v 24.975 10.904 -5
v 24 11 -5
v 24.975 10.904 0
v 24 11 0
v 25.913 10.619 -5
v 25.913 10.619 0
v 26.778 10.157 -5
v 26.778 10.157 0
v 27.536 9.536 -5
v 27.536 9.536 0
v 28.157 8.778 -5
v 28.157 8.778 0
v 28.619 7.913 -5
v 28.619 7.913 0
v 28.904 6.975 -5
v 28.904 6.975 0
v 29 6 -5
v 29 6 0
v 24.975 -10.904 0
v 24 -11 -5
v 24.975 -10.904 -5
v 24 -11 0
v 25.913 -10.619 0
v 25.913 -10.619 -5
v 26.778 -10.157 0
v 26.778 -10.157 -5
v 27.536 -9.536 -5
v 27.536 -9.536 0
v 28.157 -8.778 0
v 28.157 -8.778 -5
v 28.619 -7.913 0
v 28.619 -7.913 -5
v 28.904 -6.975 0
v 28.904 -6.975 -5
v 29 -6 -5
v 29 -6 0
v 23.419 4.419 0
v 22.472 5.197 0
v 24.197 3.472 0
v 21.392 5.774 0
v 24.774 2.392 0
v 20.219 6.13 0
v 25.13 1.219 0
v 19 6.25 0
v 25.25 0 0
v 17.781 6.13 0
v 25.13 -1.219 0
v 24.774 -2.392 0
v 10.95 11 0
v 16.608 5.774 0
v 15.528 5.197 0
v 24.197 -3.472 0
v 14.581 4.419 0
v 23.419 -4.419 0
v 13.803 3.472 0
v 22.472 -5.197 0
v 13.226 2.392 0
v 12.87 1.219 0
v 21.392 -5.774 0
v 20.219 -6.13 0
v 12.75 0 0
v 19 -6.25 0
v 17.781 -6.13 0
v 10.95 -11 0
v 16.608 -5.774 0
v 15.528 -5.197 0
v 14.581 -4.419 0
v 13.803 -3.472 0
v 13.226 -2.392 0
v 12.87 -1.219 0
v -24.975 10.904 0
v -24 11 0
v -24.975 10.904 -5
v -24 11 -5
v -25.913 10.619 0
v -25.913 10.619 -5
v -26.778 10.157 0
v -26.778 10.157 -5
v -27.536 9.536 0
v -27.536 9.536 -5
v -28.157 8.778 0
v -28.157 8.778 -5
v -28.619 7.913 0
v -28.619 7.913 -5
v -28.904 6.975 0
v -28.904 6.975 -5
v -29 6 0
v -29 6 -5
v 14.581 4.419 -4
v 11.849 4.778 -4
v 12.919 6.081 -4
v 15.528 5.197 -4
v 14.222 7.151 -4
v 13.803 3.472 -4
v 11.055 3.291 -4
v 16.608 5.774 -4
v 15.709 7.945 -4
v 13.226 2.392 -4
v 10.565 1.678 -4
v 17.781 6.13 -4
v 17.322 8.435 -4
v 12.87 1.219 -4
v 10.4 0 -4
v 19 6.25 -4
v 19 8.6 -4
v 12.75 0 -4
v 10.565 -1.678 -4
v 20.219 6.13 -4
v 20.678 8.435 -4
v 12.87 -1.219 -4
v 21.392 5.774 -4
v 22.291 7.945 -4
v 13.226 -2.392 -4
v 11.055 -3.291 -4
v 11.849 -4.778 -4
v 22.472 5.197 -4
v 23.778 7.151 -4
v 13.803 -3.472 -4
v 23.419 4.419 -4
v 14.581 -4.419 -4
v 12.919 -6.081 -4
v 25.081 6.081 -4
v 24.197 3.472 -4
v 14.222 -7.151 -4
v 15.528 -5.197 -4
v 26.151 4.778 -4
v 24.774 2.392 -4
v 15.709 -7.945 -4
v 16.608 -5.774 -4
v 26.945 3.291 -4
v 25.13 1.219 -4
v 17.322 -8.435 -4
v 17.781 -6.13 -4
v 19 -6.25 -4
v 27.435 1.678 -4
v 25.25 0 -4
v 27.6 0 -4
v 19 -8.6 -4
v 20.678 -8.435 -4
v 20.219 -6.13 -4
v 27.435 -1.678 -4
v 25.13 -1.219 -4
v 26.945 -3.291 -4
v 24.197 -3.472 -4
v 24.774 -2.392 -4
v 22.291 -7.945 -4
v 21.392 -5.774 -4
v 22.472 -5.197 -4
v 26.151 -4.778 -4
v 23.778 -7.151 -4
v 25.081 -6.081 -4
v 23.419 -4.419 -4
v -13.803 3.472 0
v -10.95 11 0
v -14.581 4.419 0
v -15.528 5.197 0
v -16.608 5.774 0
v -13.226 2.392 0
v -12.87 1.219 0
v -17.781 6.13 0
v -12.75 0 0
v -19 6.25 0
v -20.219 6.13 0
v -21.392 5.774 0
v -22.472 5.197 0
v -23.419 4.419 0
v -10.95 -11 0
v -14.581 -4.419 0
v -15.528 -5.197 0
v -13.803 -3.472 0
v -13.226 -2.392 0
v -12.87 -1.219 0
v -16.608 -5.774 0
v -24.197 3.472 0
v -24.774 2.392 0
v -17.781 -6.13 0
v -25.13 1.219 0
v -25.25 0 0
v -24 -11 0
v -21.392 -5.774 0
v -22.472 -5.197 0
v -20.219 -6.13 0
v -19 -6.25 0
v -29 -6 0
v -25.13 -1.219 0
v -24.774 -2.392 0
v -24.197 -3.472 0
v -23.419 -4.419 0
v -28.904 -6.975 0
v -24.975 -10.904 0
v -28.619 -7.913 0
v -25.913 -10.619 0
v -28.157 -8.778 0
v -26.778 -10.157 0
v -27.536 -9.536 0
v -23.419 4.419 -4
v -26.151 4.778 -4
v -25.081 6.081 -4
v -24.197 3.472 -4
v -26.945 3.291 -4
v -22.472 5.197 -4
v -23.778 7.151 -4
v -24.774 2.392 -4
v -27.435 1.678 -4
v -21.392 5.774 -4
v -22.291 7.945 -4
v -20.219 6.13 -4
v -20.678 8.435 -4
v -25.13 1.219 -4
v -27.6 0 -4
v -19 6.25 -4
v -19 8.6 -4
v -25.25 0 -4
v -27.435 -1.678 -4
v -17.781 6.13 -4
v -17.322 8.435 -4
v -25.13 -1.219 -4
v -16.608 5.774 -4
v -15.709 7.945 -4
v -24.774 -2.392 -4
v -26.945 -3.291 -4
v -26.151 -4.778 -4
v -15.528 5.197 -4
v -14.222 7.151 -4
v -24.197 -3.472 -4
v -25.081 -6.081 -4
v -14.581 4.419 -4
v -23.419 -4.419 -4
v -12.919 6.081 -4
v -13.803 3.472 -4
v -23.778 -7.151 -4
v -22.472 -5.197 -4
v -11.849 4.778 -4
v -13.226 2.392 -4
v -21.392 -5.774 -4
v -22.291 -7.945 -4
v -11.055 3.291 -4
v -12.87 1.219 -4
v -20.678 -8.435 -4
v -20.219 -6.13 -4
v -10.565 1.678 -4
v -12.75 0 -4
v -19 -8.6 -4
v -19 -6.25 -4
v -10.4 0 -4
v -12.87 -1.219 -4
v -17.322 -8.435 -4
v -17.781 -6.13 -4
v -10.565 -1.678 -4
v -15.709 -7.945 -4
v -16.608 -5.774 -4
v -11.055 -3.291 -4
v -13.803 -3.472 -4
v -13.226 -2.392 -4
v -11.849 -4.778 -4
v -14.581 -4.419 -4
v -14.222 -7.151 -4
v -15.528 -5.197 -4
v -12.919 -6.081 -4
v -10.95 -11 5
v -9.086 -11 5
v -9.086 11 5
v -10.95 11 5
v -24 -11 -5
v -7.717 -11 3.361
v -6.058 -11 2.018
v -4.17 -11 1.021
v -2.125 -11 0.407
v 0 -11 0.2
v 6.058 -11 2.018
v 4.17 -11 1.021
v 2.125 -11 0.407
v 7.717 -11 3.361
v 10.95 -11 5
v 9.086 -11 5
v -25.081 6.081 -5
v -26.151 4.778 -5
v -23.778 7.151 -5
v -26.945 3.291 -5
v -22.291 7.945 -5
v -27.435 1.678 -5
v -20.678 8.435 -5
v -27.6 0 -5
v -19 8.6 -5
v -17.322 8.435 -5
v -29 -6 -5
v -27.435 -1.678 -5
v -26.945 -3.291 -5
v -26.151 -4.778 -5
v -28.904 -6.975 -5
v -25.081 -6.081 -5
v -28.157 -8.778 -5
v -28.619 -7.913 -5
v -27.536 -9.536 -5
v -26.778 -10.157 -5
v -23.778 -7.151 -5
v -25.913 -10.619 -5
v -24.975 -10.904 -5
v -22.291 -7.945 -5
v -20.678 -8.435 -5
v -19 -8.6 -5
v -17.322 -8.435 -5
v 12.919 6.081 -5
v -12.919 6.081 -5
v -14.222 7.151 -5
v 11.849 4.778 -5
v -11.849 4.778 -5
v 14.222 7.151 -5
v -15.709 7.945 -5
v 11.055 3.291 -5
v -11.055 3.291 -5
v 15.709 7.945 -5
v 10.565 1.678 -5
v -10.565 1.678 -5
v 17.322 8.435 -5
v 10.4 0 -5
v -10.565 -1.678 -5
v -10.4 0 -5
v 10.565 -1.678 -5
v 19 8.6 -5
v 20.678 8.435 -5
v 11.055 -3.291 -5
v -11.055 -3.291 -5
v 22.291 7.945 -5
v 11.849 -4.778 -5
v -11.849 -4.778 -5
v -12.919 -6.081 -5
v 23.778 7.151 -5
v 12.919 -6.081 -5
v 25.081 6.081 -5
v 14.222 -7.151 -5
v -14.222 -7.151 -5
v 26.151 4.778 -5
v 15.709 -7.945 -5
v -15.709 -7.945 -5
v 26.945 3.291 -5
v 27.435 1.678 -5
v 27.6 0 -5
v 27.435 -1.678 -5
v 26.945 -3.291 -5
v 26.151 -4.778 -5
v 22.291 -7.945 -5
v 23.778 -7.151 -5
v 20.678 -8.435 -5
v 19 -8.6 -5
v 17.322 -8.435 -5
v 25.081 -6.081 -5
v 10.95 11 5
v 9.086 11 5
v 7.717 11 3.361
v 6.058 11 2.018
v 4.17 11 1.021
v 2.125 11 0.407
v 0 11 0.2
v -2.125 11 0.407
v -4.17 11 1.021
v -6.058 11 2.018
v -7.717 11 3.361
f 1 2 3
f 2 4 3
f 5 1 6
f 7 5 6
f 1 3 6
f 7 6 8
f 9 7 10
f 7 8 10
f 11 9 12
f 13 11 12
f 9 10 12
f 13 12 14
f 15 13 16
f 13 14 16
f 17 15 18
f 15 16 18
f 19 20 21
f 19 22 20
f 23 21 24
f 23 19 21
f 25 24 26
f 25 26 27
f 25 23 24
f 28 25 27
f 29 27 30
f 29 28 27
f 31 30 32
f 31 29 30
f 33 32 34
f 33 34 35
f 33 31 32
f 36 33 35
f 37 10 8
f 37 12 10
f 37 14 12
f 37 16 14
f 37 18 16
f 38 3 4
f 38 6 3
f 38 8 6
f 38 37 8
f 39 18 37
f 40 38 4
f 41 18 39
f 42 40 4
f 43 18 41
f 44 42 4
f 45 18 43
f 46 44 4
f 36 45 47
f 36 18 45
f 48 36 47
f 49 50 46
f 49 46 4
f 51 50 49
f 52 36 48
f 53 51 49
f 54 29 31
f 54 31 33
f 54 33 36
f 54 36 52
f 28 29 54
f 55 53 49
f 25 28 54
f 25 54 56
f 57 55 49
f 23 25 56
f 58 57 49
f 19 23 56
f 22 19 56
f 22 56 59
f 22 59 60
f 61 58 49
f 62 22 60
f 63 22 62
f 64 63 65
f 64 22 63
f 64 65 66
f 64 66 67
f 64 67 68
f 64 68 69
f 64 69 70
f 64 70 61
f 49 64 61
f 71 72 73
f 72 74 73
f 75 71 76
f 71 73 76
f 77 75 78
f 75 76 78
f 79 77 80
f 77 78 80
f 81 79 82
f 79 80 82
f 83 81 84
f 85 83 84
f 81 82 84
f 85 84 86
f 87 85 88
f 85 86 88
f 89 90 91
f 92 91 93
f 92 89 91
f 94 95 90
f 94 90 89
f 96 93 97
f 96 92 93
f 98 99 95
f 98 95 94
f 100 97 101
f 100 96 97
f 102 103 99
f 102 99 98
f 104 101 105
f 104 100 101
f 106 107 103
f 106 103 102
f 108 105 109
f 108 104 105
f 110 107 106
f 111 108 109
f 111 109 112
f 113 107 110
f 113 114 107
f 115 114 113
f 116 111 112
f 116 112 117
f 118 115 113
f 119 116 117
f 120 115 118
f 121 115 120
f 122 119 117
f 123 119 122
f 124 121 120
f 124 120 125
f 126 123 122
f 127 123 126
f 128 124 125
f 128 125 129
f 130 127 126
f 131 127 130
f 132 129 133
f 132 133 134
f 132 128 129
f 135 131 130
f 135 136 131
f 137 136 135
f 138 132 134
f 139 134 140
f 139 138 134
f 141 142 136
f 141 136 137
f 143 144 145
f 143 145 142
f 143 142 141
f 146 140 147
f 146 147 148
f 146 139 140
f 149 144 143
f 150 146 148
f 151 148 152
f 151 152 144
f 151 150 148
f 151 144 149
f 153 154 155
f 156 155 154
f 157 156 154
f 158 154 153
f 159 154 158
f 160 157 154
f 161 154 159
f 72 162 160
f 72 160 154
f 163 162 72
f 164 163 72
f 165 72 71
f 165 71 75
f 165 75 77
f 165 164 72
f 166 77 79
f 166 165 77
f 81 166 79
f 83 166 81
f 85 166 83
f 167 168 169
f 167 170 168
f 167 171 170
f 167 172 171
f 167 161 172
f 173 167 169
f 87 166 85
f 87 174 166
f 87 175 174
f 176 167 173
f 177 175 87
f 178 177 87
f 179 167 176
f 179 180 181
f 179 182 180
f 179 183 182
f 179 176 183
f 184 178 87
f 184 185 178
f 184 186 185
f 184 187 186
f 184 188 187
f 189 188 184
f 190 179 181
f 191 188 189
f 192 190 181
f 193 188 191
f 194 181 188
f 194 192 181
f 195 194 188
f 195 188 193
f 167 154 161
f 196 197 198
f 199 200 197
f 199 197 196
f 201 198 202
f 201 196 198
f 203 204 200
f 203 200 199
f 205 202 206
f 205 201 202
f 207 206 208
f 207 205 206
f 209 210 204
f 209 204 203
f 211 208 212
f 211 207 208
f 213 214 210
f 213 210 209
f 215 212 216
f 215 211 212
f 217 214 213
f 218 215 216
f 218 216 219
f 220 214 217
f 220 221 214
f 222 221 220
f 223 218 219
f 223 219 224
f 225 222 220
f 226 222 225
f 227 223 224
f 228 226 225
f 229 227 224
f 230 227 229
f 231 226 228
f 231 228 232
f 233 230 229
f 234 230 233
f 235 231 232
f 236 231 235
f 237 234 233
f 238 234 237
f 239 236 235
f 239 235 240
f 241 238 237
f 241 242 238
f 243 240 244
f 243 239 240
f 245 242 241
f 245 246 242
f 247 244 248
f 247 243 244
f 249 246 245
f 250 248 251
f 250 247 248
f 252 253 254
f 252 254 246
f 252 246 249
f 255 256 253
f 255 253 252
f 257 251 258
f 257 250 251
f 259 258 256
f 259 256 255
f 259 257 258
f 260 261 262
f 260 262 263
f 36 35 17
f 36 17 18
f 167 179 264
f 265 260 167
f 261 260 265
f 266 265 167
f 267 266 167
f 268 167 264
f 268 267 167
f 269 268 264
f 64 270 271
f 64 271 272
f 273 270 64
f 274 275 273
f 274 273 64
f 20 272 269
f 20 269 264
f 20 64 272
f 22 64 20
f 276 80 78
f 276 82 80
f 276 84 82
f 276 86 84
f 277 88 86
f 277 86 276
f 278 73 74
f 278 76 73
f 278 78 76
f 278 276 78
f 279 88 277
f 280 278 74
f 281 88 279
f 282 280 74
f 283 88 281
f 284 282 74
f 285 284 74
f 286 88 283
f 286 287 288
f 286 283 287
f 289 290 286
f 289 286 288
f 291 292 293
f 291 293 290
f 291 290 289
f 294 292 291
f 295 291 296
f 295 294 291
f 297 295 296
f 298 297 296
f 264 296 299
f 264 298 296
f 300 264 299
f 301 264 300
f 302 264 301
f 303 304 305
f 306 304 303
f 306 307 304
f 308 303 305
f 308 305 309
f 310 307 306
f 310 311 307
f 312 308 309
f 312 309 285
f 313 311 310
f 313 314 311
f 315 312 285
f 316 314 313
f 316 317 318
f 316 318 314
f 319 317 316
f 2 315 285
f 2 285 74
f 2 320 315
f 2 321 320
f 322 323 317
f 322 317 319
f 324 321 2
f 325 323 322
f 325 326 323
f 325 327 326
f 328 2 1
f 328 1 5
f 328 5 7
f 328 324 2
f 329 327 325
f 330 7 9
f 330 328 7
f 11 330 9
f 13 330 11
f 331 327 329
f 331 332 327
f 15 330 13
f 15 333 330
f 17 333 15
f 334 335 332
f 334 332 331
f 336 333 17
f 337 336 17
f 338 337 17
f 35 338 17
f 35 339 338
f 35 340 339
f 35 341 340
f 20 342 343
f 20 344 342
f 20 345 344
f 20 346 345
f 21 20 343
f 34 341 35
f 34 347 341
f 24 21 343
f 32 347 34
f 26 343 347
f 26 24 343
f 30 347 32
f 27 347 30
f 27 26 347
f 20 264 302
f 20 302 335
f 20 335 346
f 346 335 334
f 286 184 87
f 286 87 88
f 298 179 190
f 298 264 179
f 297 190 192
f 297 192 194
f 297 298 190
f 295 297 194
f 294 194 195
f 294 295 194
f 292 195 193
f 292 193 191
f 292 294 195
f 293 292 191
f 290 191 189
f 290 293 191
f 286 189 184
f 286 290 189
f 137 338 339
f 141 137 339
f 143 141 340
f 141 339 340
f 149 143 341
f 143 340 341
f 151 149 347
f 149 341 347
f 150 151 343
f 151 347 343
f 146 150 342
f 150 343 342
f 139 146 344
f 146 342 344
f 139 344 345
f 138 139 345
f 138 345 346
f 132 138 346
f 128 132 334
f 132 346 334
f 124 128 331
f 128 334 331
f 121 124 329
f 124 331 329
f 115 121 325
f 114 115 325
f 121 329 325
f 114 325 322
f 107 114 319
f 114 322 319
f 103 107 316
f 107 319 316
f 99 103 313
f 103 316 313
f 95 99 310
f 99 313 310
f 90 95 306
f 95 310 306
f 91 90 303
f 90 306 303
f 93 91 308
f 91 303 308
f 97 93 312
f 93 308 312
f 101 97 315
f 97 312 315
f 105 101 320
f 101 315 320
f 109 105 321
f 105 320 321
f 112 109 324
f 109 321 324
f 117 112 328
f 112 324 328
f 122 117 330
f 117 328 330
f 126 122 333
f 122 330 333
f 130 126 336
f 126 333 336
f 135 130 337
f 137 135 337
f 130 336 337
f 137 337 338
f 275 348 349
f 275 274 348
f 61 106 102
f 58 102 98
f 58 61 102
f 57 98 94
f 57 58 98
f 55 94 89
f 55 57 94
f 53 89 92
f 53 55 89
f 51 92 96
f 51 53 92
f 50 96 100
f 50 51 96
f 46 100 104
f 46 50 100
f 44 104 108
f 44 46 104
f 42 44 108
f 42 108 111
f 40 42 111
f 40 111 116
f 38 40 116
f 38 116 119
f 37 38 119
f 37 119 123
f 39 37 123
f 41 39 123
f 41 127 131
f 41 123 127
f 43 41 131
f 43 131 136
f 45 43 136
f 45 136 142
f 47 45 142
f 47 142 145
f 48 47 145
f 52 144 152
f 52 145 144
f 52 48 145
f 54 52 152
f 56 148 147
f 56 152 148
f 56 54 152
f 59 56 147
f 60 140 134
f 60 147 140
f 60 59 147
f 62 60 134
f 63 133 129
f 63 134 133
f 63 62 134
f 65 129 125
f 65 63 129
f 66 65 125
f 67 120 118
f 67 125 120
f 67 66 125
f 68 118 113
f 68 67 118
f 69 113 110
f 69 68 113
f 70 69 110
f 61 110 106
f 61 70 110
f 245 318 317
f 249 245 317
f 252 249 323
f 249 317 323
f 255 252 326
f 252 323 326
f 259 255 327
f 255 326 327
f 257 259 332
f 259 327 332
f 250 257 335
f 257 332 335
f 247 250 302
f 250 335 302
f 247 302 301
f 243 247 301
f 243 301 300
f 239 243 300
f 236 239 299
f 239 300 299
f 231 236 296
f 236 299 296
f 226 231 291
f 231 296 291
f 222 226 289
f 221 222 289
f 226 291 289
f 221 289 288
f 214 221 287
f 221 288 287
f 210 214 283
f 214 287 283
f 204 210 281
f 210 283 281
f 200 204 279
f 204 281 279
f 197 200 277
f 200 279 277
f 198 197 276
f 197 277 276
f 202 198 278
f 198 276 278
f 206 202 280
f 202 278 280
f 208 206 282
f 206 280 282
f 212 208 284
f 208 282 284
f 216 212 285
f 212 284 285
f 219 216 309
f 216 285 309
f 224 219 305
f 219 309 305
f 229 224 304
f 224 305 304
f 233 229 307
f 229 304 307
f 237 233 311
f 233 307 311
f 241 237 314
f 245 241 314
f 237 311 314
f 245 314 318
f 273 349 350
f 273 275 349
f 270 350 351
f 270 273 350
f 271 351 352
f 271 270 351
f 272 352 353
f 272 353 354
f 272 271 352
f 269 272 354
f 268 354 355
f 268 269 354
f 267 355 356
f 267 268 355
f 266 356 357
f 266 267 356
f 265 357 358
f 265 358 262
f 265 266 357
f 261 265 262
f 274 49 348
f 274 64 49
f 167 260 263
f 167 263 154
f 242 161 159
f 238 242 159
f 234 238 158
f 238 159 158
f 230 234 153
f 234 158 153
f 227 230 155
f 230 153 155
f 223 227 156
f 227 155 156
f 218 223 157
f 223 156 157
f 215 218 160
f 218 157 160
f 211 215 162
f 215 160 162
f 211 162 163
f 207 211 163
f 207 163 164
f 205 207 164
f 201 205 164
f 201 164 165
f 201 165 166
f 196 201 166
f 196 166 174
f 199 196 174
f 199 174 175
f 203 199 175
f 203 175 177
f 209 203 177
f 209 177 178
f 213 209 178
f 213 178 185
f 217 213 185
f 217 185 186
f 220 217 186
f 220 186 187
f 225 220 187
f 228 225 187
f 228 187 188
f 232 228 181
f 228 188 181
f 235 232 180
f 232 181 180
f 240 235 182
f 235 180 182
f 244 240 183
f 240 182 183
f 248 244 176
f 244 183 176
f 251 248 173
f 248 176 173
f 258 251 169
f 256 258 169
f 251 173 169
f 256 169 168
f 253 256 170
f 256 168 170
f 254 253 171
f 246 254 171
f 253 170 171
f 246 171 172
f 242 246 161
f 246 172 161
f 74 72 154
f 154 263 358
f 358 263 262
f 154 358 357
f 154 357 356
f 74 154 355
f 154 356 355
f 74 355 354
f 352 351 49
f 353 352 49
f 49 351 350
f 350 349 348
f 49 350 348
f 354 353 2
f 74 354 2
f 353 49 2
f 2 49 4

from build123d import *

# Parameters (mm, degrees)
F2_DEPTH = 11
F3_R     = 6.25
F4_DEPTH = 5.001
F5_R     = 5
F6_R     = 8.6
F7_DEPTH = 1


# Not quite as in the source:
# - a pattern or mirror of a feature is missing from the dataset's text; its kind, count and spacing are read off the source's solid


with BuildPart() as f2:
    # F1 (on Front) → F2 (new body, symmetric)
    with BuildSketch(Plane.XZ):
        with BuildLine():
            ThreePointArc((9.0862533533, 5), (0, 0.2), (-9.0862533533, 5))
            Line((-9.0862533533, 5), (-10.95, 5))
            Line((-10.95, 5), (-10.95, 0))
            Line((-10.95, 0), (-29, 0))
            Line((-29, 0), (-29, -5))
            Line((-29, -5), (29, -5))
            Line((29, -5), (29, 0))
            Line((29, 0), (10.95, 0))
            Line((10.95, 0), (10.95, 5))
            Line((10.95, 5), (9.0862533533, 5))
        make_face()
    extrude(amount=F2_DEPTH, both=True)

    # F3 (on Top) → F4 (cut, through all)
    with BuildSketch(Plane.XY):
        with Locations((-19, 0)):
            Circle(F3_R)
    f4 = extrude(amount=-F4_DEPTH, mode=Mode.SUBTRACT)

    # F4_copies: F4 across plane
    add(f4.mirror(Plane(origin=(0, 0, 0), x_dir=(0, 0, 1), z_dir=(1, 0, 0))), mode=Mode.SUBTRACT)

    # F5
    f5_edges = [f2.edges().sort_by_distance(p)[0] for p in [
        (-29, -11, -2.5),
        (-29, 11, -2.5),
        (29, -11, -2.5),
        (29, 11, -2.5),
    ]]
    fillet(f5_edges, radius=F5_R)

    # F6 (on face) → F7 (cut)
    with BuildSketch(Plane(origin=(0, 0, -5), x_dir=(1, 0, 0), z_dir=(0, 0, -1))):
        with Locations((-19, 0)):
            Circle(F6_R)
        with Locations((19, 0)):
            Circle(F6_R)
    extrude(amount=-F7_DEPTH, mode=Mode.SUBTRACT)


solid = f2.part
